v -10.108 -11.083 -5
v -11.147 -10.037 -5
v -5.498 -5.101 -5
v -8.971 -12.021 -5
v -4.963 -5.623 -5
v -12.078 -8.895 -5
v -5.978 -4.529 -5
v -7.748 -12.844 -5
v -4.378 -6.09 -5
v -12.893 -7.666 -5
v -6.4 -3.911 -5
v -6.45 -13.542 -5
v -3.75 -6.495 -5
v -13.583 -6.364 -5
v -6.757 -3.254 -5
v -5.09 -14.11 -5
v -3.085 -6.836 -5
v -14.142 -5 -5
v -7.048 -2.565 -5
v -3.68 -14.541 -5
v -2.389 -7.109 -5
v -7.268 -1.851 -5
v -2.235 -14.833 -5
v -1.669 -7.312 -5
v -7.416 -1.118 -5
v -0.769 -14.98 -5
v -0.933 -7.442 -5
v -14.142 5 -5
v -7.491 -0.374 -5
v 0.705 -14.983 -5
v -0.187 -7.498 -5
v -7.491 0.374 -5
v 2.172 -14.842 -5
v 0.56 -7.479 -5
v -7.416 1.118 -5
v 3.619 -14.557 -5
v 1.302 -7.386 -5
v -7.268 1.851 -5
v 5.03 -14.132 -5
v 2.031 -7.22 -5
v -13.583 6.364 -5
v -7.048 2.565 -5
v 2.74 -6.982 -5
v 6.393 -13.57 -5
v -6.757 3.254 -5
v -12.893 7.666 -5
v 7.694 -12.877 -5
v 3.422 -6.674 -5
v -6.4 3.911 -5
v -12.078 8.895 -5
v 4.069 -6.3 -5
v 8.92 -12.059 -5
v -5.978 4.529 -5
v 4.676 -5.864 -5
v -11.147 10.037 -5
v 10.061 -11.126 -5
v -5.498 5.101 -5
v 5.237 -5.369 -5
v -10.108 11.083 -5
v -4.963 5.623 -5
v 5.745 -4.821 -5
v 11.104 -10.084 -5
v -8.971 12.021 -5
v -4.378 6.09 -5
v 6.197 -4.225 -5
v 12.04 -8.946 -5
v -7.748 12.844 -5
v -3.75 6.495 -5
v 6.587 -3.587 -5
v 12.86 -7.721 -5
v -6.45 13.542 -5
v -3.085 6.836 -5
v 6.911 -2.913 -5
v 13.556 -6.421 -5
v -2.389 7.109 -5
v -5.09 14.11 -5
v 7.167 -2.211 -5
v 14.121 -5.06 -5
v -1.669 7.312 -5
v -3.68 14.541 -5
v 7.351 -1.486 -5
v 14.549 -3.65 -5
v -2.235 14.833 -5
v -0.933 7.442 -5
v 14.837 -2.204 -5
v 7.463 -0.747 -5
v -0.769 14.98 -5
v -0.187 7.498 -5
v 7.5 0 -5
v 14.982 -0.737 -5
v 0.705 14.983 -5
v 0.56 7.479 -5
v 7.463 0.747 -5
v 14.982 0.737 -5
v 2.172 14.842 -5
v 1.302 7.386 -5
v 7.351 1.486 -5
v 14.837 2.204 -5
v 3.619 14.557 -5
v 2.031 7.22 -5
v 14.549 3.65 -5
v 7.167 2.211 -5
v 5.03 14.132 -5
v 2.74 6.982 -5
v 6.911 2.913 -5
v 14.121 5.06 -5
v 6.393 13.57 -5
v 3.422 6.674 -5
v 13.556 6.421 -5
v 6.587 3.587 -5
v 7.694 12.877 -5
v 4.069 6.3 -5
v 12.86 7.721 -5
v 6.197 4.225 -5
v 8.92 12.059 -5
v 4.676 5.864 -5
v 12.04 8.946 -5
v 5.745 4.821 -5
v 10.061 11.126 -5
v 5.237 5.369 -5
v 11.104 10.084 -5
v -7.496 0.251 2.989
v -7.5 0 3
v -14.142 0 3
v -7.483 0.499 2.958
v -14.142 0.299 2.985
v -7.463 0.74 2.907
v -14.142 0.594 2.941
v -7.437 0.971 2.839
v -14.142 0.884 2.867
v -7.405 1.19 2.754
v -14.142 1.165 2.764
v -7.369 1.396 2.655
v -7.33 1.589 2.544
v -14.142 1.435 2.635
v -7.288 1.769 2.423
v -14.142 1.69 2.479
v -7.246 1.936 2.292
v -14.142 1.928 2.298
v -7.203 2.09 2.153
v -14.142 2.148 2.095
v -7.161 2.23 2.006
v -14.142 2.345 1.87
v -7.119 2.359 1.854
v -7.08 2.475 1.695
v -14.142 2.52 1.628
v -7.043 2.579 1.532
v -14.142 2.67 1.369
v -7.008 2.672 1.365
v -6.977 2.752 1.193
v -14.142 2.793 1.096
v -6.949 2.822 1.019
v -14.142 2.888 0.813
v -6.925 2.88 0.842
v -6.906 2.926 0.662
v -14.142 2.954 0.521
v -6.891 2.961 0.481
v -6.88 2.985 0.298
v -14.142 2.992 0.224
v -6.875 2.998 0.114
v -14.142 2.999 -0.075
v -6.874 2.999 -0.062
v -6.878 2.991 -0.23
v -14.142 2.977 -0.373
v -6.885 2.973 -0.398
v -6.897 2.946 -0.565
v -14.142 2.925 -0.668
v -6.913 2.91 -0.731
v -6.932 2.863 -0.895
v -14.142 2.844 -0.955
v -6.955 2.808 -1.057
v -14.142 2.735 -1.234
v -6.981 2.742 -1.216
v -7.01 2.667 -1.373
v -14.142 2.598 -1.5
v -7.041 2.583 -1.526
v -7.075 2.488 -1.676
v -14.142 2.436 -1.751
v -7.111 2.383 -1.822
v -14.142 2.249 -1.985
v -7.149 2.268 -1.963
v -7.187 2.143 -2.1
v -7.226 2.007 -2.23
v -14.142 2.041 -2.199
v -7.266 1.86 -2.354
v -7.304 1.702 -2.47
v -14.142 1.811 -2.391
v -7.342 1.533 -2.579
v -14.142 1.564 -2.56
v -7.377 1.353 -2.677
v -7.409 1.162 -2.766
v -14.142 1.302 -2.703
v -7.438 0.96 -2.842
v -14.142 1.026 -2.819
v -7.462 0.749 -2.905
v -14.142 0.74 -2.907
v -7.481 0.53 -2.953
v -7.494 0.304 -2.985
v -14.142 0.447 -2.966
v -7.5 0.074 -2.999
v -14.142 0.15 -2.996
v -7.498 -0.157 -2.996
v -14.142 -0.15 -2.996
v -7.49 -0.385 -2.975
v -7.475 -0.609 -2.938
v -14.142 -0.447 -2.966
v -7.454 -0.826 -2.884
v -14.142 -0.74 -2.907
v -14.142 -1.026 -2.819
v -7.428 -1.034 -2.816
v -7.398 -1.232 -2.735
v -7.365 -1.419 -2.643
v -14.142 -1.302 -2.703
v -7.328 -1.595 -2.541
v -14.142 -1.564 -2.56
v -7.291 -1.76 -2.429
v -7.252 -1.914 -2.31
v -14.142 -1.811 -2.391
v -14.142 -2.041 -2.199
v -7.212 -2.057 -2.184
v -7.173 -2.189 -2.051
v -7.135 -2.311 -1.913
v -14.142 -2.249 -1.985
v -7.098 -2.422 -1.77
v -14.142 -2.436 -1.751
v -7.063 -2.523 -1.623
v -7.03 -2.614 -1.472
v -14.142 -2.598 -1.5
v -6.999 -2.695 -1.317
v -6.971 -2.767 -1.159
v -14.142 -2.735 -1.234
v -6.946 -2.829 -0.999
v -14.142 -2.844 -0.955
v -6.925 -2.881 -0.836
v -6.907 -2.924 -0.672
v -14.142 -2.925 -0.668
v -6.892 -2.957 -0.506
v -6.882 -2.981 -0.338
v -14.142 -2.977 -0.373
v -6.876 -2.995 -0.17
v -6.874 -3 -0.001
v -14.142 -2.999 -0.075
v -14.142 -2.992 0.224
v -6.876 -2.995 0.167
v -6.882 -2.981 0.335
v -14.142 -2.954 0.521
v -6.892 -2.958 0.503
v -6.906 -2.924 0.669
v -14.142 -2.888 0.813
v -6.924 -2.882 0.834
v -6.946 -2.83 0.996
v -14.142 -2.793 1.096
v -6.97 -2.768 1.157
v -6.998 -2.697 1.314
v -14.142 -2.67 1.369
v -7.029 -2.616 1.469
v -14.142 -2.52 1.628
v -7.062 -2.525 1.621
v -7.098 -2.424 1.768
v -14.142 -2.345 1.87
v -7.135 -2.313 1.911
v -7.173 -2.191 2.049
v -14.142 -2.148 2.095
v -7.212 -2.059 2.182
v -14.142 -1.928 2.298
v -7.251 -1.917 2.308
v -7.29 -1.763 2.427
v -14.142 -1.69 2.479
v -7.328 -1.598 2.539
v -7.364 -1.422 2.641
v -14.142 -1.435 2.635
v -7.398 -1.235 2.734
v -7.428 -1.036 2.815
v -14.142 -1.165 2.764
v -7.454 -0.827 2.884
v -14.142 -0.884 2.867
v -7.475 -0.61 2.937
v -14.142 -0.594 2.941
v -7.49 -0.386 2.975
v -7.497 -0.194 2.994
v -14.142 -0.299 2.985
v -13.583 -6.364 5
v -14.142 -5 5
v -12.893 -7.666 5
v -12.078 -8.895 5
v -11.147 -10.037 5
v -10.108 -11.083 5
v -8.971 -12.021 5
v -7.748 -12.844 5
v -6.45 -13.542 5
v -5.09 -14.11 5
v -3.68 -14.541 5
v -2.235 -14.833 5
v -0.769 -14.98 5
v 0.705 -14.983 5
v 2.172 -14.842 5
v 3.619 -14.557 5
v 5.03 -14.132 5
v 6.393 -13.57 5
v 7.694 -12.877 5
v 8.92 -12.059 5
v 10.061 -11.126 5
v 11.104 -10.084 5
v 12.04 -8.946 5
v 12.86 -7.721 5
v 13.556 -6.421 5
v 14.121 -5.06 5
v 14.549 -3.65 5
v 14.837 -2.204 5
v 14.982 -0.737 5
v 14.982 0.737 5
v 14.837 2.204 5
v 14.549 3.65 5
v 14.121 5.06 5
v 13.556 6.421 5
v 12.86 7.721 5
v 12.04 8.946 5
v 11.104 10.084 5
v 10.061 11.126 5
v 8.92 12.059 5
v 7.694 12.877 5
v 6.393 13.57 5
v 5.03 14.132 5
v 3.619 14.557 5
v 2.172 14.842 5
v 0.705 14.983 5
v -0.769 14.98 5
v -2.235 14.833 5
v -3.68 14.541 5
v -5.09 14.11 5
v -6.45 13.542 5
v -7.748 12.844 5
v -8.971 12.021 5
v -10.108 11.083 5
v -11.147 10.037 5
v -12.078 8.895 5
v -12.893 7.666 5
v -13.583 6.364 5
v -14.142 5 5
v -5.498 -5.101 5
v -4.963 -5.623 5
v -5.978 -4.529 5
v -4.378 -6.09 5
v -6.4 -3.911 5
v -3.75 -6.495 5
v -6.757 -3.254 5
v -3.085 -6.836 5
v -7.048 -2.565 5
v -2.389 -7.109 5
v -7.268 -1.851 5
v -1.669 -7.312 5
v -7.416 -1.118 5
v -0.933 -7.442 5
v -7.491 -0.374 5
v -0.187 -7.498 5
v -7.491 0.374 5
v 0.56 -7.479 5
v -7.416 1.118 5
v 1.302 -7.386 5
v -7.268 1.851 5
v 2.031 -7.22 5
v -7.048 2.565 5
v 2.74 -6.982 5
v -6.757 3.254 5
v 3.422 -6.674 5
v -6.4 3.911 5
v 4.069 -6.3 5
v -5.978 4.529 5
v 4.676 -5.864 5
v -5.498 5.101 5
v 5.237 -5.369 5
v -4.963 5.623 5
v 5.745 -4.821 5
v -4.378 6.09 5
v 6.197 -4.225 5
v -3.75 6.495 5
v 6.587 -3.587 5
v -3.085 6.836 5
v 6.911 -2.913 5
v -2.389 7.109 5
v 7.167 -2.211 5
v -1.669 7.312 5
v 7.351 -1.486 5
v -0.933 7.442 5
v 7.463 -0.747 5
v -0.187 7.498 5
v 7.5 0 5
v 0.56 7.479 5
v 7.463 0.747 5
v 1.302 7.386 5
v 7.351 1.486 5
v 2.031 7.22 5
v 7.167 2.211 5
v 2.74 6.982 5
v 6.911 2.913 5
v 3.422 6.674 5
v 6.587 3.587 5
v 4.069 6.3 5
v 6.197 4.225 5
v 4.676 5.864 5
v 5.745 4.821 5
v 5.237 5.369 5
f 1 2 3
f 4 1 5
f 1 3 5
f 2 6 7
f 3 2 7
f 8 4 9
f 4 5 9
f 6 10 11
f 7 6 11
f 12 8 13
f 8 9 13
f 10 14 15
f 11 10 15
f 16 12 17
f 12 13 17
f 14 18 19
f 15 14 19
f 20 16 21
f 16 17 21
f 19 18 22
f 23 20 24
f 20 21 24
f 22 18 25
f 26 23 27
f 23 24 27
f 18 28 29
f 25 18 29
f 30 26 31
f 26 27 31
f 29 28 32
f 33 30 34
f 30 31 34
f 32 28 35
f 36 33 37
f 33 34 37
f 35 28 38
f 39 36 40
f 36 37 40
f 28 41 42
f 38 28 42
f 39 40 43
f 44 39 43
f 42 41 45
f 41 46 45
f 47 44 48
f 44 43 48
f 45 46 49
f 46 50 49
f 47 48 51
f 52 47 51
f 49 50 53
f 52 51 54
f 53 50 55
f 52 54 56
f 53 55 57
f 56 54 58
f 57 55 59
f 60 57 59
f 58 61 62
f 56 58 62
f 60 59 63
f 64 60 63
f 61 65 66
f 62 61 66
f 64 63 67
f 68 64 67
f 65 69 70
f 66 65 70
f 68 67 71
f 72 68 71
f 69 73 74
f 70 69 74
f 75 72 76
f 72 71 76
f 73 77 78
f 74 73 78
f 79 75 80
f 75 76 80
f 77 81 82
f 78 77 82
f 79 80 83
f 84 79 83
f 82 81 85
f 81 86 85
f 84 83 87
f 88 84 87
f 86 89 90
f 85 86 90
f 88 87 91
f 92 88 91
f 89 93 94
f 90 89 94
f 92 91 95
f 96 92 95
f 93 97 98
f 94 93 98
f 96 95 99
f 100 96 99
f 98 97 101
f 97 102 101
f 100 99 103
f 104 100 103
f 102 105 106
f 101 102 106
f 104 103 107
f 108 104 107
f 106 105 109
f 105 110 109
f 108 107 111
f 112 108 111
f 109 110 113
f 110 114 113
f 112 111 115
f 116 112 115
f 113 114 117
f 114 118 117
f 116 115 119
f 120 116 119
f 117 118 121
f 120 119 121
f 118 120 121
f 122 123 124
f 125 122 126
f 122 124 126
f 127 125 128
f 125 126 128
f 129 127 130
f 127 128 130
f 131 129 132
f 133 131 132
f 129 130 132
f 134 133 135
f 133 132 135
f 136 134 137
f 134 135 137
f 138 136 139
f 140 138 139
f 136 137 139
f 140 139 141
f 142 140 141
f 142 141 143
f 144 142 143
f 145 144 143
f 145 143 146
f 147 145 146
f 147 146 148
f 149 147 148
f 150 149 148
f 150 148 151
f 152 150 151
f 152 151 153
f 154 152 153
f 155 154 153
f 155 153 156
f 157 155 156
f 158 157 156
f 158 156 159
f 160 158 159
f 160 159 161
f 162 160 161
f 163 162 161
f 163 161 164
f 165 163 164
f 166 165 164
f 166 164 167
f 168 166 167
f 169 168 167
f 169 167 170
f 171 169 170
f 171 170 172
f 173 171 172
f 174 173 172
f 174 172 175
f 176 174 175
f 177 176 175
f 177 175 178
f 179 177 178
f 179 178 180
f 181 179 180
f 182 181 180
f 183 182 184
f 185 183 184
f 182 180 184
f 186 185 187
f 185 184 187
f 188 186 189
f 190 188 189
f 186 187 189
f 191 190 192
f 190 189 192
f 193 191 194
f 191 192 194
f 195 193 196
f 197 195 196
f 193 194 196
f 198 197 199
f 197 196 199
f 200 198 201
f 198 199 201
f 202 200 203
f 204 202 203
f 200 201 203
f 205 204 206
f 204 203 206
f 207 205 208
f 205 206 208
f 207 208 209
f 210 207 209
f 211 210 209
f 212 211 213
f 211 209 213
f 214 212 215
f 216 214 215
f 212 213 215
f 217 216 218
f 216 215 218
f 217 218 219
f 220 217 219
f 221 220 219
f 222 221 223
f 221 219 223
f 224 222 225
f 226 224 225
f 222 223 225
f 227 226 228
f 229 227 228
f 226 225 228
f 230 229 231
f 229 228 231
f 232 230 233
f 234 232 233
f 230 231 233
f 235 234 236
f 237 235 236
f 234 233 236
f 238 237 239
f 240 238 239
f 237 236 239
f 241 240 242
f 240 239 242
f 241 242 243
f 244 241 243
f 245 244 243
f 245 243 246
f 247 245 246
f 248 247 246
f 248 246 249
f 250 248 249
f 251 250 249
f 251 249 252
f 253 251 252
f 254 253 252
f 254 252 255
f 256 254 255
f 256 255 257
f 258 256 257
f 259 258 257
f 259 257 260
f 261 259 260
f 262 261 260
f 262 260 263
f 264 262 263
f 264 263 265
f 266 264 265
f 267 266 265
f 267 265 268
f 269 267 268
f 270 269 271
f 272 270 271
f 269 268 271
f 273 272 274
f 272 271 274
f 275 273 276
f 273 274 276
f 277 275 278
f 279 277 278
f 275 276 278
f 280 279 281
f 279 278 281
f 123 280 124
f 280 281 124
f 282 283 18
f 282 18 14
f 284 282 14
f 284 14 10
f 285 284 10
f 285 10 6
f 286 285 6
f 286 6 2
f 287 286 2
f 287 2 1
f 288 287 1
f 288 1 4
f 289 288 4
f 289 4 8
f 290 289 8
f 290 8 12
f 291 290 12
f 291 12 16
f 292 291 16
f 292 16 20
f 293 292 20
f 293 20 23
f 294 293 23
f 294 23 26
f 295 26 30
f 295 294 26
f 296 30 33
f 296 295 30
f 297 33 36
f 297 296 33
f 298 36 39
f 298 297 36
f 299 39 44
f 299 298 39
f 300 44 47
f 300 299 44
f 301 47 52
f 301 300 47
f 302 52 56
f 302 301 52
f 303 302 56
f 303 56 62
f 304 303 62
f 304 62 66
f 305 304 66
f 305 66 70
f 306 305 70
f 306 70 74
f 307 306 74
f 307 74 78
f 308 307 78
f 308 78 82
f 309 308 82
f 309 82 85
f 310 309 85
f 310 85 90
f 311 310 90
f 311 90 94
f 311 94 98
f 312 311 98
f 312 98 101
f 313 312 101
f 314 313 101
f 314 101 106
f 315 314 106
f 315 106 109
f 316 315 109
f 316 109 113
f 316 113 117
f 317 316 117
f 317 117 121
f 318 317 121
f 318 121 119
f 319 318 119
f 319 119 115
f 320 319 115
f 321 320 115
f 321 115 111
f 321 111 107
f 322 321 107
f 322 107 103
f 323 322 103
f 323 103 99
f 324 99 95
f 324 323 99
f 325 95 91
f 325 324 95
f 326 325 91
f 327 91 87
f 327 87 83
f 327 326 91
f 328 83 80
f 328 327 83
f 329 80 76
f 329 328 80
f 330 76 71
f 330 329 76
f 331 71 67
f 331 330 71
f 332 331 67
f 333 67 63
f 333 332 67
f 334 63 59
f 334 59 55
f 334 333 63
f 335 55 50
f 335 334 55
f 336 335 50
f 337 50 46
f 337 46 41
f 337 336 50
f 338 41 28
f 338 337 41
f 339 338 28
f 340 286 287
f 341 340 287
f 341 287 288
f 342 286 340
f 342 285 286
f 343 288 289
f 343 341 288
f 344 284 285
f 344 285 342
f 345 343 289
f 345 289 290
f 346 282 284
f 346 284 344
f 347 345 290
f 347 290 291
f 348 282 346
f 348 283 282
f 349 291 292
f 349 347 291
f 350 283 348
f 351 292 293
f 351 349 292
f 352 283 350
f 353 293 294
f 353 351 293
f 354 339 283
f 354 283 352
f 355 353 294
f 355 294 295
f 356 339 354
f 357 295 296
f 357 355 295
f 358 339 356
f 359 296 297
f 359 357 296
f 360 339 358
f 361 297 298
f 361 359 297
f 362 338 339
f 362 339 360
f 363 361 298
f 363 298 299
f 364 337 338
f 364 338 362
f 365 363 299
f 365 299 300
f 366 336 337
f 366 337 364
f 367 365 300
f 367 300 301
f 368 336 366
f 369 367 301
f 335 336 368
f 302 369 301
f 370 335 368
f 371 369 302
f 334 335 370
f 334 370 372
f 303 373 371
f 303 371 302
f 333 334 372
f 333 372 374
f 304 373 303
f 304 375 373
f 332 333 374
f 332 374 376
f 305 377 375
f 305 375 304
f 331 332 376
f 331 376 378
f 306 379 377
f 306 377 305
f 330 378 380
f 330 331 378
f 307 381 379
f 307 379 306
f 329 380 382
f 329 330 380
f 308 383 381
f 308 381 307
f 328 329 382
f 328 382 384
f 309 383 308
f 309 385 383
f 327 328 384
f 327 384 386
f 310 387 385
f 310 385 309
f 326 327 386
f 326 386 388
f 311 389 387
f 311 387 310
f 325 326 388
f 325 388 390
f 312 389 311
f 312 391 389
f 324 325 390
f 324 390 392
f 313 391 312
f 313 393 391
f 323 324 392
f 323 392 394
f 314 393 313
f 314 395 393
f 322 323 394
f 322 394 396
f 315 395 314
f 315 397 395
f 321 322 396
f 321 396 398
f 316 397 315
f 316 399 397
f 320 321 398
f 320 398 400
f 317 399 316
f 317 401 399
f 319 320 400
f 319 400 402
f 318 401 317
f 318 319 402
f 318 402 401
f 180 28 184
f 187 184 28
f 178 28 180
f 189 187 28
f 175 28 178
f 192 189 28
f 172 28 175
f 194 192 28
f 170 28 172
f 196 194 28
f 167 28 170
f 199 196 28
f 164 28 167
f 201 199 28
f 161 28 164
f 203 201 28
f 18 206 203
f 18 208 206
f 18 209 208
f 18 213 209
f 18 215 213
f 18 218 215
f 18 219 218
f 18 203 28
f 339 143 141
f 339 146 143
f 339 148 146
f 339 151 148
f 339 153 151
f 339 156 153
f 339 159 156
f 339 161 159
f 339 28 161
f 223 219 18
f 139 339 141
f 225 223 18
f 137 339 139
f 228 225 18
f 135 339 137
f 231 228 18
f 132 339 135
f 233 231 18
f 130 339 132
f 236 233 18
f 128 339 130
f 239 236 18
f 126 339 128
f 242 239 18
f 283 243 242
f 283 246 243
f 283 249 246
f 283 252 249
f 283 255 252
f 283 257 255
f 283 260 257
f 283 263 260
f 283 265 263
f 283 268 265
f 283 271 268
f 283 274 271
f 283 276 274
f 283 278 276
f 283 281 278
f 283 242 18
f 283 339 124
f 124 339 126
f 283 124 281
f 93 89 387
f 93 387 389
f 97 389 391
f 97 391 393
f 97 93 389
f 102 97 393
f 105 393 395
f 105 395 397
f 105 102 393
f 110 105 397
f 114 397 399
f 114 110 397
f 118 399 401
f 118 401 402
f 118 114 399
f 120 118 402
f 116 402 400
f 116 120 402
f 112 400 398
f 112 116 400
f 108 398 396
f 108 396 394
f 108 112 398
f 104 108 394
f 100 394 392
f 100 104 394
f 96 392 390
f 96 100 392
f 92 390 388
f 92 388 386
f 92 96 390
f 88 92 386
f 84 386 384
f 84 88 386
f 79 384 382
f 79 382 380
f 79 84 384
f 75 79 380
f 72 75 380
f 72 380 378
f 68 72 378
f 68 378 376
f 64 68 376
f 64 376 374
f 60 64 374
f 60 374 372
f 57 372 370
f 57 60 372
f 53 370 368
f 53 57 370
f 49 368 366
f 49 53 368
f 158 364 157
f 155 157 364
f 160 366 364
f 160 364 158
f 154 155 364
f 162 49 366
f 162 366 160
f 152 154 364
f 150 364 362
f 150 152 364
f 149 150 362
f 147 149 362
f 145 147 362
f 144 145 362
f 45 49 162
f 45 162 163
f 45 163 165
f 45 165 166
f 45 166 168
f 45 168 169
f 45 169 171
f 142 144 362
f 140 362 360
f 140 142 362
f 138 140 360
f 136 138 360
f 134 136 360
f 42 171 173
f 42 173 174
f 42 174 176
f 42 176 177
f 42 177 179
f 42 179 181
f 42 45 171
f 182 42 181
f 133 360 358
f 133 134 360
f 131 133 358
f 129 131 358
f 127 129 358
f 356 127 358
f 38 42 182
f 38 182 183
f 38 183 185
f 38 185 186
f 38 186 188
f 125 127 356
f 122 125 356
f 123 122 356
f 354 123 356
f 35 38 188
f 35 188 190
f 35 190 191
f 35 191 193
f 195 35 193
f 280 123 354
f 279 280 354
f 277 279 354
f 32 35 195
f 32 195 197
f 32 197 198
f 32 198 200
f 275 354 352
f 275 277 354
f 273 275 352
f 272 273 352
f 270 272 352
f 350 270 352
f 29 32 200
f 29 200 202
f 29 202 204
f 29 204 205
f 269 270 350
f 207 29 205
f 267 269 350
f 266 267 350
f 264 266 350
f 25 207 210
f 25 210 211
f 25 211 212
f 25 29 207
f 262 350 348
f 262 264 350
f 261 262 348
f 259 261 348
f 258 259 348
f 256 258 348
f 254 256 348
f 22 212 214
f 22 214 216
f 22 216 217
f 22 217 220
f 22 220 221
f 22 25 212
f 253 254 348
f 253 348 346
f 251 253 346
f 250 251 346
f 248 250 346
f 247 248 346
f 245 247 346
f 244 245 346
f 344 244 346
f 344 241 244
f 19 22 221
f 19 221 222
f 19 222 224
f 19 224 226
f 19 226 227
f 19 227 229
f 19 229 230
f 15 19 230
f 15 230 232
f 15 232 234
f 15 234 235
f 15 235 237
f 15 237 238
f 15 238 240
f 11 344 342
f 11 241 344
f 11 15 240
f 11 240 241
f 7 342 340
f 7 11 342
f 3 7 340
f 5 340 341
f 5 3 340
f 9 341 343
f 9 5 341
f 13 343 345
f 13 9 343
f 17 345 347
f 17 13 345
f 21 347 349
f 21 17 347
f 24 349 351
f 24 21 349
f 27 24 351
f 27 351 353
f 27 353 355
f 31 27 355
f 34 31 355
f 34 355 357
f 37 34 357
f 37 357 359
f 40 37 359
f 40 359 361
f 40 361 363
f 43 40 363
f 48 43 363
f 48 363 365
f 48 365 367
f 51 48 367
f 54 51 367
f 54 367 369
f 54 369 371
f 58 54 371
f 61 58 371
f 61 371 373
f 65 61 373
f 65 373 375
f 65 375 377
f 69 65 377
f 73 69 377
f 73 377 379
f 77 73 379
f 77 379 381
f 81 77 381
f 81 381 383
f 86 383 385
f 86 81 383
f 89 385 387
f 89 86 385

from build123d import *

# Parameters (mm, degrees)
SKIZZE1_R                       = 15
SKIZZE1_R_2                     = 7.5
AUFSATZ_LINEAR_AUSTRAGEN1_DEPTH = 5
SCHNITT_LINEAR_AUSTRAGEN1_DEPTH = 11
SCHNITT_LINEAR_AUSTRAGEN2_REACH = 31.142
SKIZZE3_R                       = 3


with BuildPart() as part:
    # Skizze1 → Aufsatz-Linear austragen1 (new body, symmetric)
    with BuildSketch(Plane.XY):
        Circle(SKIZZE1_R)
        Circle(SKIZZE1_R_2, mode=Mode.SUBTRACT)
    extrude(amount=AUFSATZ_LINEAR_AUSTRAGEN1_DEPTH, both=True)

    # Skizze2 → Schnitt-Linear austragen1 (cut, through all)
    with BuildSketch(Plane.XY.offset(5)):
        with BuildLine():
            Line((-14.142135624, 5), (-14.142135624, -5))
            ThreePointArc((-14.142135624, -5), (-15, 0), (-14.142135624, 5))
        make_face()
    extrude(amount=-SCHNITT_LINEAR_AUSTRAGEN1_DEPTH, mode=Mode.SUBTRACT)

    # Skizze3 → Schnitt-Linear austragen2 (cut, up to next)
    with BuildSketch(Plane.ZY.offset(14.142135624), mode=Mode.PRIVATE) as schnitt_linear_austragen2_sk1:
        Circle(SKIZZE3_R)
    schnitt_linear_austragen2_tool1 = extrude(schnitt_linear_austragen2_sk1.sketch, amount=-SCHNITT_LINEAR_AUSTRAGEN2_REACH, mode=Mode.PRIVATE) & part.part
    add(schnitt_linear_austragen2_tool1.solids().sort_by_distance((-14.142136, 0, 0))[0], mode=Mode.SUBTRACT)


solid = part.part
